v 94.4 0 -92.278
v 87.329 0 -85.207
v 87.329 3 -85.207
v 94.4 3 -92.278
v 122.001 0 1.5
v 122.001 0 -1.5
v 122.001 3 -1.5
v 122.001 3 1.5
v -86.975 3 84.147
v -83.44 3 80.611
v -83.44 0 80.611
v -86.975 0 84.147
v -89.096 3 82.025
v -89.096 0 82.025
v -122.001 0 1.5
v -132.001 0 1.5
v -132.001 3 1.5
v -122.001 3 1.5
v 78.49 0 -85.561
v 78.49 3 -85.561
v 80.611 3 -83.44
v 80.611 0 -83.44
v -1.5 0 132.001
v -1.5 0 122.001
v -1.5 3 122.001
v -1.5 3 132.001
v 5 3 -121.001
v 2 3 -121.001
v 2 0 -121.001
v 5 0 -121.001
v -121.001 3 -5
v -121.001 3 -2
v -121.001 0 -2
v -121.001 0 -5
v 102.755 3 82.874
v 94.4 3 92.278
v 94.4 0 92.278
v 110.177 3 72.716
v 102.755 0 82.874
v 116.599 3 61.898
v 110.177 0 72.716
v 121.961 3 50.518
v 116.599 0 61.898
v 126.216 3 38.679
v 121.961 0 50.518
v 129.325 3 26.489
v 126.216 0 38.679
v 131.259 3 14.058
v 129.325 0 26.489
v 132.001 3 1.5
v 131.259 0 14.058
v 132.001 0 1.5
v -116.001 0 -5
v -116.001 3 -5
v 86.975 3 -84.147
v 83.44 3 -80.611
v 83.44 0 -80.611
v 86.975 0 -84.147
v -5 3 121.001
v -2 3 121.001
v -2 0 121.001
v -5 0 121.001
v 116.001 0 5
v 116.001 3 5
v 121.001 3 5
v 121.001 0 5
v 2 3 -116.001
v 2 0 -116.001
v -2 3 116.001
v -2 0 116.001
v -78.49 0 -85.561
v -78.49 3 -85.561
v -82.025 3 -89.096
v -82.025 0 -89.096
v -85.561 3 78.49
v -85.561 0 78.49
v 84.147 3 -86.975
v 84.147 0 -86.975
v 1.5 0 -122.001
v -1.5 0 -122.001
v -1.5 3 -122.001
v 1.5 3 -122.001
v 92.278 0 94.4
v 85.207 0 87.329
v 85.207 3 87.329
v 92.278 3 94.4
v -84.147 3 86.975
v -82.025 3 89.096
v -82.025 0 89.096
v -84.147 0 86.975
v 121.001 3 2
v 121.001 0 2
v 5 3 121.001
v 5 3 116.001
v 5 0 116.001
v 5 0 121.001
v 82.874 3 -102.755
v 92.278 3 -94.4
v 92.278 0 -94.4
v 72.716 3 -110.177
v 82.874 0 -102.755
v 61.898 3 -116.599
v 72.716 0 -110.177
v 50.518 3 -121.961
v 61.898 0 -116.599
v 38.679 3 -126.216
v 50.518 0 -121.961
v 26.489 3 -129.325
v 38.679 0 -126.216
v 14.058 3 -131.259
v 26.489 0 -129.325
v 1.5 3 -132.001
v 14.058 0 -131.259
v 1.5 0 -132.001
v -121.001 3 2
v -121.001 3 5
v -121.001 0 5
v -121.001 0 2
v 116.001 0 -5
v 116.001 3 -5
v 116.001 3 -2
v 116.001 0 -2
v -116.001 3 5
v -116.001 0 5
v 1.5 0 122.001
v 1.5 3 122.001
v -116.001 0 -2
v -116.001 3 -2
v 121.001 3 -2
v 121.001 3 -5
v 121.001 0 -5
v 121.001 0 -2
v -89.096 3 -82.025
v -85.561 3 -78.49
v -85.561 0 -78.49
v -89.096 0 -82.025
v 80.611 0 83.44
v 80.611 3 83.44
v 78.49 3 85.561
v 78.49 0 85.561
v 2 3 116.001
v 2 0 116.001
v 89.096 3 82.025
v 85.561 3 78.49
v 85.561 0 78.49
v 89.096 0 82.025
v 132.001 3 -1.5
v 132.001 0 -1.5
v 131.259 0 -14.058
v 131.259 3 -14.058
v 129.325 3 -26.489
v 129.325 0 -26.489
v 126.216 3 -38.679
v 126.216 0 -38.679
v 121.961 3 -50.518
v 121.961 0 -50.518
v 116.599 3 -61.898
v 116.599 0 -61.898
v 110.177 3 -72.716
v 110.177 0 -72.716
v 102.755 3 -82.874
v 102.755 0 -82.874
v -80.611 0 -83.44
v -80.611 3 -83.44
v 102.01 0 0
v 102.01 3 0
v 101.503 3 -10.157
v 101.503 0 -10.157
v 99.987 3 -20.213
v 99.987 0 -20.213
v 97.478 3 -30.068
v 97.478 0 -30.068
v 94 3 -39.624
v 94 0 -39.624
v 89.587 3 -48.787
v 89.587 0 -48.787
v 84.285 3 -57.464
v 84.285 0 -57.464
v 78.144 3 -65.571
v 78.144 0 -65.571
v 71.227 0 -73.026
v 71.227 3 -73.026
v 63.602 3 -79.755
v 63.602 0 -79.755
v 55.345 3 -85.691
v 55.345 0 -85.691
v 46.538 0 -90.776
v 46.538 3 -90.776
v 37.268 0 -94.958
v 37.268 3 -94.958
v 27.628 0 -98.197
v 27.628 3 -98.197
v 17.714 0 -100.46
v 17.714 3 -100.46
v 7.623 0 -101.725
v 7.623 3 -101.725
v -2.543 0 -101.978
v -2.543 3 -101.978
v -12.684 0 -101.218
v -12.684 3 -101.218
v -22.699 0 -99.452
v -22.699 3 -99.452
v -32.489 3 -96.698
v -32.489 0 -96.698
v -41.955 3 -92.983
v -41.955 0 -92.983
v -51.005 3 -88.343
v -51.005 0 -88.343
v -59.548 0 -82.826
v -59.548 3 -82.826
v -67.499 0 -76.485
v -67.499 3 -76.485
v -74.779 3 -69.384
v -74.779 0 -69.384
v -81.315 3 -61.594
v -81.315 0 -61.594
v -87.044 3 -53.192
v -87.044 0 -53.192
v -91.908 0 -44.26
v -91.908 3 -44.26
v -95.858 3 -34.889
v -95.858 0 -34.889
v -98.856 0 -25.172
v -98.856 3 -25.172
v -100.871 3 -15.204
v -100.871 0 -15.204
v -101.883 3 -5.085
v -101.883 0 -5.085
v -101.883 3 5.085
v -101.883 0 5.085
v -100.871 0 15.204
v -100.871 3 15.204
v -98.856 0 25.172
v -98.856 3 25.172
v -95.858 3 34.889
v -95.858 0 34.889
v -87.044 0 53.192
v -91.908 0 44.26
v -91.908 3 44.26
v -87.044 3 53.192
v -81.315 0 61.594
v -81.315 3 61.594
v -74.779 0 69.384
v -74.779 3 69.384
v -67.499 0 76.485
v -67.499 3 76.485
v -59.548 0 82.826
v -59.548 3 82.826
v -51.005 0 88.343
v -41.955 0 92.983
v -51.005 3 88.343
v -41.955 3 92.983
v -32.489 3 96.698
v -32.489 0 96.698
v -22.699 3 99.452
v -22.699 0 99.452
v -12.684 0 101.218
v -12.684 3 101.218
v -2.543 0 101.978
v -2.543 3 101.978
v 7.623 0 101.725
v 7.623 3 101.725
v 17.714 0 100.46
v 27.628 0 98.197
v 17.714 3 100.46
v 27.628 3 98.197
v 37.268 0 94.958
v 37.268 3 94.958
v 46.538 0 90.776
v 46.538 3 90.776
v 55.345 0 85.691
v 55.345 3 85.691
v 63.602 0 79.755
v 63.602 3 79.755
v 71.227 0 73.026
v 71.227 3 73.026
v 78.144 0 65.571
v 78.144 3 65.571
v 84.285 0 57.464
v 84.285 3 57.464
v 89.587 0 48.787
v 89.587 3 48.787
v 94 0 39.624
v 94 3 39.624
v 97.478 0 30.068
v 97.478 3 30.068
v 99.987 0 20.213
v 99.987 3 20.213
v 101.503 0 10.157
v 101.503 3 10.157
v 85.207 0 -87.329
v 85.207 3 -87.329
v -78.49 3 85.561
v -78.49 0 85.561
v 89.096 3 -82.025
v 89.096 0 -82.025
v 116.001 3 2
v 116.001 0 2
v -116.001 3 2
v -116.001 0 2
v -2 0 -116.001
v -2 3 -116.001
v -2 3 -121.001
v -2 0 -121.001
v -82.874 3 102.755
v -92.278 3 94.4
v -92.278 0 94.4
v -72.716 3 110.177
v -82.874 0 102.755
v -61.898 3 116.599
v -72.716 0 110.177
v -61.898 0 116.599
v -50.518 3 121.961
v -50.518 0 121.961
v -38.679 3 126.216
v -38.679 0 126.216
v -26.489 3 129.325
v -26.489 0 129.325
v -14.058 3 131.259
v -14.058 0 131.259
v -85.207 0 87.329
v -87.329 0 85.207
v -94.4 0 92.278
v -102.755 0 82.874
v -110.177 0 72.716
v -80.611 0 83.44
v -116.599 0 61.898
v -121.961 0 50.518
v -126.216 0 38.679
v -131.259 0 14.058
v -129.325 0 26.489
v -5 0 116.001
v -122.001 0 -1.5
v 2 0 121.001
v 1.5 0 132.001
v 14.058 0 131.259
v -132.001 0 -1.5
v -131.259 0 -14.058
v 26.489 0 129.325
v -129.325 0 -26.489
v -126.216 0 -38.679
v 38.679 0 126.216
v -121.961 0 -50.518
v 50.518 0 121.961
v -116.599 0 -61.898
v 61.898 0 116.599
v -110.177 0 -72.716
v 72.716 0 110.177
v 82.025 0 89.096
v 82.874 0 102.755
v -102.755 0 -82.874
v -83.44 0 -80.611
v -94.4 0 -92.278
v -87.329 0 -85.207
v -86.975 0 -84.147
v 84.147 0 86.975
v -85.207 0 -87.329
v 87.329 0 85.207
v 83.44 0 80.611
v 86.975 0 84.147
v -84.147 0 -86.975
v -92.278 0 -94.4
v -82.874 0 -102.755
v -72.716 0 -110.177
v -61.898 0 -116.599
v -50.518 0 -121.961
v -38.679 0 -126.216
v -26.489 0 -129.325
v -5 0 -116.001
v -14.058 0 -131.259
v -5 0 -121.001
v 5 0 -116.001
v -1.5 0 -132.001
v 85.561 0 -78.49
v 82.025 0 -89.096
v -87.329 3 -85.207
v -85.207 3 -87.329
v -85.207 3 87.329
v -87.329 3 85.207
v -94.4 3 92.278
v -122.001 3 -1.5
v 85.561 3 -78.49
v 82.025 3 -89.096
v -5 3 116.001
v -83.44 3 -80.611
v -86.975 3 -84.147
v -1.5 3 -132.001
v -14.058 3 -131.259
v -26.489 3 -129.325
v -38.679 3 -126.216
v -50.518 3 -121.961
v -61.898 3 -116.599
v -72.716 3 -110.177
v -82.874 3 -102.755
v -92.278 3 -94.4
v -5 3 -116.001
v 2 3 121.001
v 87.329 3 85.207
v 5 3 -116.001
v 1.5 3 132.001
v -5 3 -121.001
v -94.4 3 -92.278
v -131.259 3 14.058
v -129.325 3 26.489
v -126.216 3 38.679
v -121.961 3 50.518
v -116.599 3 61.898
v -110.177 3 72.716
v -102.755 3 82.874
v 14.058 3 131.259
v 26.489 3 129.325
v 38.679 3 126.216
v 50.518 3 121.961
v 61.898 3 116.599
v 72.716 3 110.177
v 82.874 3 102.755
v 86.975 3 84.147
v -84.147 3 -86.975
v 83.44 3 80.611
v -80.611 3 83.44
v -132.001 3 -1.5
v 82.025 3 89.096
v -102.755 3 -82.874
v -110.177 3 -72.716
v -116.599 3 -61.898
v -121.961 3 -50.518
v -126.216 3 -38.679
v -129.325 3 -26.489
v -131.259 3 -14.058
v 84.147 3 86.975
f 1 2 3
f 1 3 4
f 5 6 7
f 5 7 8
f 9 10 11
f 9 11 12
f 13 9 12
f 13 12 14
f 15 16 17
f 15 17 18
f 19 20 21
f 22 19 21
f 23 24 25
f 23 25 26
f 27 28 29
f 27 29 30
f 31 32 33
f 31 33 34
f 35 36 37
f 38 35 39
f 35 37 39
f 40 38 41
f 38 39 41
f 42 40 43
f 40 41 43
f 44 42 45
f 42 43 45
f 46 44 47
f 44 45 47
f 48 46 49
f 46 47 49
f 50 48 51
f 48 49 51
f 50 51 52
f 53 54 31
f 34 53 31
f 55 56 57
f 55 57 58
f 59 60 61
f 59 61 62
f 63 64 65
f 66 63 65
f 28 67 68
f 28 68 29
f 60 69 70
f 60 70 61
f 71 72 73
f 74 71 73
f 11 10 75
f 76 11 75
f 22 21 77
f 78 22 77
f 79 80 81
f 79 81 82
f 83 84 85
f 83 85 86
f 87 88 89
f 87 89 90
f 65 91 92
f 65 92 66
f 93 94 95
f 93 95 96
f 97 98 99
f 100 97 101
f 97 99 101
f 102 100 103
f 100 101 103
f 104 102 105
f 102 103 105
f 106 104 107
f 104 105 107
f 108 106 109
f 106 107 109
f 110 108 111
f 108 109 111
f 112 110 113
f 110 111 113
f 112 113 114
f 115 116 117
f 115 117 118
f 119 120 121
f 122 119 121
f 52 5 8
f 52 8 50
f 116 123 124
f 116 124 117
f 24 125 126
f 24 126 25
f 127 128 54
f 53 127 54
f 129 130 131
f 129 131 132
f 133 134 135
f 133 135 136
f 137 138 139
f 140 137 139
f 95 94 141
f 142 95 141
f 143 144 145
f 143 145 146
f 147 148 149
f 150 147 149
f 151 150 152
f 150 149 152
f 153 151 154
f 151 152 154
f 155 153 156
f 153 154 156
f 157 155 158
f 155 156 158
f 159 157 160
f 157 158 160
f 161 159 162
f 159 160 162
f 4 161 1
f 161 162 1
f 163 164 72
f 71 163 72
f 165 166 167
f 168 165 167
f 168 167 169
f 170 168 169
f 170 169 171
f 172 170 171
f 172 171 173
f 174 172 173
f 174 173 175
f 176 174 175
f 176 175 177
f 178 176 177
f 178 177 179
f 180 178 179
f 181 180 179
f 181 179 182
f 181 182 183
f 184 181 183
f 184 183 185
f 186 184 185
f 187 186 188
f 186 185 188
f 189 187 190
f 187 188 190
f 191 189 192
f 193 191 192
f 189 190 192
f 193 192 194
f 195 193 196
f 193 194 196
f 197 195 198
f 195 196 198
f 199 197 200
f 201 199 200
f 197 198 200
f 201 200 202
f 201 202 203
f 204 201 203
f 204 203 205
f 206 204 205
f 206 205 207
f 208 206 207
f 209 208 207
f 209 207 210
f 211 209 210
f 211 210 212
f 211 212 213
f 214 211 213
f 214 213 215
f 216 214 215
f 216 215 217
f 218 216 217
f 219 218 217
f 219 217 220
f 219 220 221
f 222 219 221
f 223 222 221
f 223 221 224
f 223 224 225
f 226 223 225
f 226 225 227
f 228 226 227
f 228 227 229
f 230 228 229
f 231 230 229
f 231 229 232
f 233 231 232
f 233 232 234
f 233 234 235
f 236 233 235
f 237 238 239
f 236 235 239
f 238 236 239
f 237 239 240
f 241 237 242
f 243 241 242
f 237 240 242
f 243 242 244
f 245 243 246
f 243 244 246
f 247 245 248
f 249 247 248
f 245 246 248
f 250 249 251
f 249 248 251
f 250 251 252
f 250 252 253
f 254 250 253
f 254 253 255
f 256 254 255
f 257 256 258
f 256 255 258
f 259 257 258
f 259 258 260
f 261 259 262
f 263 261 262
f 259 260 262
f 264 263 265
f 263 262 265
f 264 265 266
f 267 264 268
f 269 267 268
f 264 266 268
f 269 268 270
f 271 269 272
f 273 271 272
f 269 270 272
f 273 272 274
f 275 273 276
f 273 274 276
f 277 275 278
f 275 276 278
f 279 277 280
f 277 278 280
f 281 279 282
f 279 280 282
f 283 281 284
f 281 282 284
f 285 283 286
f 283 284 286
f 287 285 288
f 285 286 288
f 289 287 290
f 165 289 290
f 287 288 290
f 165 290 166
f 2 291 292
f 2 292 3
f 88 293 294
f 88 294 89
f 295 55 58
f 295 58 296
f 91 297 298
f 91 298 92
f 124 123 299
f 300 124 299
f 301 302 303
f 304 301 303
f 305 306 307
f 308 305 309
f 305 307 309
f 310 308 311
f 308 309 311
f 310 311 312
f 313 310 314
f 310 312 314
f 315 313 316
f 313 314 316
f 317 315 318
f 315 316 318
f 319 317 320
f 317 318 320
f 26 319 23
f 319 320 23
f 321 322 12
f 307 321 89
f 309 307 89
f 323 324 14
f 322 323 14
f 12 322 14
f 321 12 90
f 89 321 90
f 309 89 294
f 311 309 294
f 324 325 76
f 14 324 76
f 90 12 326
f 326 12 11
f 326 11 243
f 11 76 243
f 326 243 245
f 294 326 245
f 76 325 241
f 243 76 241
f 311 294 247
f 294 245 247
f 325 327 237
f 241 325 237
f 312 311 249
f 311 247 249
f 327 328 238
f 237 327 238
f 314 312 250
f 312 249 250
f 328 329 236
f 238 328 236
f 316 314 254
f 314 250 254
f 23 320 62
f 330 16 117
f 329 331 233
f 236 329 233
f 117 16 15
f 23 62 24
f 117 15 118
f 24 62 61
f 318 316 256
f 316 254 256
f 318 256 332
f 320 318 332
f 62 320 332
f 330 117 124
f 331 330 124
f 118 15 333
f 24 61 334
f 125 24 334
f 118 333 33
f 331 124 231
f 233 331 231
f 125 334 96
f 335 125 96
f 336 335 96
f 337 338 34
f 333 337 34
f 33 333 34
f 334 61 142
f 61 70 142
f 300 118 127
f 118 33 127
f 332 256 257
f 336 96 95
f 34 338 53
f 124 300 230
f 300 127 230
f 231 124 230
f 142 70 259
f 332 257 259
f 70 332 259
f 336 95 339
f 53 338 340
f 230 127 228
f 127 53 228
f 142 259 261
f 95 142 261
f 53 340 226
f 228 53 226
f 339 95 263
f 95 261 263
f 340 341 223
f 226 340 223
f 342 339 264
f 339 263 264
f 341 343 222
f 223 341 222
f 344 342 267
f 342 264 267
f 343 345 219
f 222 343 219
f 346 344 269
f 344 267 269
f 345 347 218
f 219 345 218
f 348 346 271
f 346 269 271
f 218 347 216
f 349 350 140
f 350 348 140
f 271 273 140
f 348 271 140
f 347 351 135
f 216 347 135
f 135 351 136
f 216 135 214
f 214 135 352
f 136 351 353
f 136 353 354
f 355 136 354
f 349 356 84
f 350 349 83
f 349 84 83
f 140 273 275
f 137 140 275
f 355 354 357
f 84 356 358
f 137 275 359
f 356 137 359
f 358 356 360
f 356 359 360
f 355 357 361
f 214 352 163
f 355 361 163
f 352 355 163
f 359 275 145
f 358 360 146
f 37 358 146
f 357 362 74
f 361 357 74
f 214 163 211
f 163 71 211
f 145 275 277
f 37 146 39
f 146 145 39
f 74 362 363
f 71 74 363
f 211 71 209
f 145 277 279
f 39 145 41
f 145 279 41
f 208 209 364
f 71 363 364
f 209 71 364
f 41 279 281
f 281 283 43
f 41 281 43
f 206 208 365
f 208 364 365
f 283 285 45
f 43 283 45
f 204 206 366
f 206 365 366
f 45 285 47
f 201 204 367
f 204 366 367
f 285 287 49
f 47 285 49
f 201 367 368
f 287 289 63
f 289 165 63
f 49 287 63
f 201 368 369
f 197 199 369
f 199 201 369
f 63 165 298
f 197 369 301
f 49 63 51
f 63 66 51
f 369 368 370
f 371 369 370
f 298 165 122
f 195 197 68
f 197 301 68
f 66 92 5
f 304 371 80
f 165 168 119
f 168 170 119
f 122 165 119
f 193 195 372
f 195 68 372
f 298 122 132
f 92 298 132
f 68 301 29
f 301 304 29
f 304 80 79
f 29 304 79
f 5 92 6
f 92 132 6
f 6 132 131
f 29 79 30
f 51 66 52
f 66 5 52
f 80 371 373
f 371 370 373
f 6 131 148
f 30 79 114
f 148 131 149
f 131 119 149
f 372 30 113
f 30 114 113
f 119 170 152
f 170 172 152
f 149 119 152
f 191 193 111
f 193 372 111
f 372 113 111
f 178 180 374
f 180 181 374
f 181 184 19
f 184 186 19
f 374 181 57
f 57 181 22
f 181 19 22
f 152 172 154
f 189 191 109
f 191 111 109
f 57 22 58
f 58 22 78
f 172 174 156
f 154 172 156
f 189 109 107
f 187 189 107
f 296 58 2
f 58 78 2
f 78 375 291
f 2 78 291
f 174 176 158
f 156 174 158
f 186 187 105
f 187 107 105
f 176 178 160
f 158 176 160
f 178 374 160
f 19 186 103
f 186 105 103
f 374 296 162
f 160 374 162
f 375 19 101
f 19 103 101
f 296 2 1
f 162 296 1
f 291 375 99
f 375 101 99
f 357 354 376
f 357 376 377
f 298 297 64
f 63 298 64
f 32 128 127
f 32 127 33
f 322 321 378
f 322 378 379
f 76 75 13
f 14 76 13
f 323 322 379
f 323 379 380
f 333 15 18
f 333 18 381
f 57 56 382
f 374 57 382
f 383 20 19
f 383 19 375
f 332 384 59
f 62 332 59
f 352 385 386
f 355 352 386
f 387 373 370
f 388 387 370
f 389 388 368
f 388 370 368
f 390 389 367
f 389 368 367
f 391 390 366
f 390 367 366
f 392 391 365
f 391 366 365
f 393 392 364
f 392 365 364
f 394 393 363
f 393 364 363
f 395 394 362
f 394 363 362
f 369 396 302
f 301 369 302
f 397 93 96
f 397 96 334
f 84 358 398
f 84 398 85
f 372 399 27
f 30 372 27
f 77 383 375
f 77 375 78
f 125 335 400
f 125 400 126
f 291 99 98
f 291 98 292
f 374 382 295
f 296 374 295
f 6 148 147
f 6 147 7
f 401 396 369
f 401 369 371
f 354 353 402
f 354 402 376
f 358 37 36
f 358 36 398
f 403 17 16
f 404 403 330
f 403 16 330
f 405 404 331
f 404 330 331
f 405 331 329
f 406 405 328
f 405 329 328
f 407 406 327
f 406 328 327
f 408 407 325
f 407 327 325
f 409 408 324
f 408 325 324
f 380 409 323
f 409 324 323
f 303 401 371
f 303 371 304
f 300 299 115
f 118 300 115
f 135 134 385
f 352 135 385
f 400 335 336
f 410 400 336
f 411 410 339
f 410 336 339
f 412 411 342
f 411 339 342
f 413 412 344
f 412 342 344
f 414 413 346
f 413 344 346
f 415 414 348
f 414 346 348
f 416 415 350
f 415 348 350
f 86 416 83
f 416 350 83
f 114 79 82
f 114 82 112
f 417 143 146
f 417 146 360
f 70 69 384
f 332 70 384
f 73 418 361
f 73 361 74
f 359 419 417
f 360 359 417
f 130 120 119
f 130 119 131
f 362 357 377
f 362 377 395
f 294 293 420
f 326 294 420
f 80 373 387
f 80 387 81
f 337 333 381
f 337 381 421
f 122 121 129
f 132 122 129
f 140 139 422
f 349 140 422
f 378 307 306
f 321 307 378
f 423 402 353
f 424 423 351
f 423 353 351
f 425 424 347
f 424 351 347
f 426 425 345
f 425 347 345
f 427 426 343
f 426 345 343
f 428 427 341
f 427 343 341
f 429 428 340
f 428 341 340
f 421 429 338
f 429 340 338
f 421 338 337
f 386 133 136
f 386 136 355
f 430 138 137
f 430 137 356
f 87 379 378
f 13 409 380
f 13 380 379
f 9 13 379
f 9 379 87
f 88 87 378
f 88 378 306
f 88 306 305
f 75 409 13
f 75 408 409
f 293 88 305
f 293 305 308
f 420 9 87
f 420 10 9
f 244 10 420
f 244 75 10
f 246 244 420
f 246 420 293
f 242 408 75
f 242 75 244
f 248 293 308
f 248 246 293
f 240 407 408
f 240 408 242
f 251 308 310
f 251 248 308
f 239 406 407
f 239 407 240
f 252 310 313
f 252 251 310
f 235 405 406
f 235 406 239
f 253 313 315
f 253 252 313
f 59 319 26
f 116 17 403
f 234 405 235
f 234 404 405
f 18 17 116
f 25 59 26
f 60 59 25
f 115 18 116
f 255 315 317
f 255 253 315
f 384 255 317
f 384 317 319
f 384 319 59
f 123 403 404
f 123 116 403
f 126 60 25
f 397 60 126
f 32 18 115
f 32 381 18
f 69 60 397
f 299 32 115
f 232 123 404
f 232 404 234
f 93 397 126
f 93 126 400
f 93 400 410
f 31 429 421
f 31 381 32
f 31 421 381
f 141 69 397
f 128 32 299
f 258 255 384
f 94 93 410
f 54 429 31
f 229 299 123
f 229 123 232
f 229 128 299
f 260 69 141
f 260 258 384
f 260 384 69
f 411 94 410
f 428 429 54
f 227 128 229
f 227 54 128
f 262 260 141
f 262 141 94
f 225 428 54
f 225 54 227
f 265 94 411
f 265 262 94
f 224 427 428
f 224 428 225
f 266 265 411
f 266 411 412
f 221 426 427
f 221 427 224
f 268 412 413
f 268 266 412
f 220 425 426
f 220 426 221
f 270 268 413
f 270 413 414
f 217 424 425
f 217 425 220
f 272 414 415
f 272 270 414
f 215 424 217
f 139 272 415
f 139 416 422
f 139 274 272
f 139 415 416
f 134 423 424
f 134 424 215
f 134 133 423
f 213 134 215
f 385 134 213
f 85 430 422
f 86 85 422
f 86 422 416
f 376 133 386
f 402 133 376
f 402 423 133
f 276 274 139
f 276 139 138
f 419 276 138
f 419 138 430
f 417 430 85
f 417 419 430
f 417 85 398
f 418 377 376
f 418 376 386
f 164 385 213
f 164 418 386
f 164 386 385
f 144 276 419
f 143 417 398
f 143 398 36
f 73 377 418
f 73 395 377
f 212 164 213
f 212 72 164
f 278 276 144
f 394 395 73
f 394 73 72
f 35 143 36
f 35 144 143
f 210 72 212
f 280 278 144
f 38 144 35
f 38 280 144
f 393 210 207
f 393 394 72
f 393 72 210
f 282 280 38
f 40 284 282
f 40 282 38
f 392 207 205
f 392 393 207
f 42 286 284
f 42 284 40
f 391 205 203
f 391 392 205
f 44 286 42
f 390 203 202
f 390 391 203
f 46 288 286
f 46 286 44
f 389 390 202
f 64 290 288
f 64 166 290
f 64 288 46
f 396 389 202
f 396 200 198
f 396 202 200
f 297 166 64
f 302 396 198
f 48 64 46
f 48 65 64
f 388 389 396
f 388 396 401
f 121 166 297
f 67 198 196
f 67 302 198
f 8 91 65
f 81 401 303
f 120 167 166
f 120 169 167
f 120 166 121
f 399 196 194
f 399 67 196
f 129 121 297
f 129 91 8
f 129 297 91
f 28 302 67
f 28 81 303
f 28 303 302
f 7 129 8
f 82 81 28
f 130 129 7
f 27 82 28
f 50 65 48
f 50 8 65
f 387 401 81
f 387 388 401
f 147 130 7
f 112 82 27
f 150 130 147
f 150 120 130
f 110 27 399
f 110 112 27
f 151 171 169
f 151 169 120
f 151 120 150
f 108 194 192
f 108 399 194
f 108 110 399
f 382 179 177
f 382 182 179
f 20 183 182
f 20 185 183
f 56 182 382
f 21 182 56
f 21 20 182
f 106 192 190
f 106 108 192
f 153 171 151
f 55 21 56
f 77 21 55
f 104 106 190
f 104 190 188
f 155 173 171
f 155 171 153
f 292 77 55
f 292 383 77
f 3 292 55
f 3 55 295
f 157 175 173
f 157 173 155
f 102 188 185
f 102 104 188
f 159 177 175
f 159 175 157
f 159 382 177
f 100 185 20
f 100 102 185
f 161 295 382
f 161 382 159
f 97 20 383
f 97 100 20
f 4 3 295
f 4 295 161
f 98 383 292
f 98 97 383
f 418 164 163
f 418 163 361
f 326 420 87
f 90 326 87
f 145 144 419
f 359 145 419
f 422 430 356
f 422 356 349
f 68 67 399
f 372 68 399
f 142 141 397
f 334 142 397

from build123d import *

# Parameters (mm, degrees)
SKETCH1_R           = 132.01
BOSS_EXTRUDE1_DEPTH = 3
CUT_EXTRUDE1_START  = -3
CUT_EXTRUDE1_DEPTH  = 4
CIRPATTERN1_COUNT   = 8
SKETCH7_W           = 3
SKETCH7_H           = 5
CUT_EXTRUDE4_DEPTH  = 3
CIRPATTERN2_COUNT   = 8
SKETCH8_R           = 102.01
CUT_EXTRUDE6_DEPTH  = 10


with BuildPart() as part:
    # Sketch1 → Boss-Extrude1 (new body)
    with BuildSketch(Plane(origin=(0, 0, 0), x_dir=(1, 0, 0), z_dir=(0, 1, 0))):
        Circle(SKETCH1_R)
    extrude(amount=BOSS_EXTRUDE1_DEPTH)

    # Sketch2 → Cut-Extrude1 (cut)
    with BuildSketch(Plane(origin=(0, 3, 0), x_dir=(1, 0, 0), z_dir=(0, 1, 0)).offset(CUT_EXTRUDE1_START)):
        Polygon((-1.5, 733.700659415), (-1.5, 132.001477643), (-1.5, 122.001477643), (1.5, 122.001477643), (1.5, 132.001477643), (1.5, 733.700659415), (1.5, 1937.099022959), (-1.5, 1937.099022959), align=None)
    cut_extrude1 = extrude(amount=CUT_EXTRUDE1_DEPTH, mode=Mode.SUBTRACT)

    # CirPattern1: Cut-Extrude1 ×8 about axis
    cirpattern1_axis = Axis((0, 0, 0), (0, -1, 0))
    for i in range(1, CIRPATTERN1_COUNT):
        add(cut_extrude1.rotate(cirpattern1_axis, i * 360 / CIRPATTERN1_COUNT), mode=Mode.SUBTRACT)

    # Sketch7 → Cut-Extrude4 (cut)
    with BuildSketch(Plane(origin=(0, 3, 0), x_dir=(1, 0, 0), z_dir=(0, 1, 0))):
        with Locations((-3.5, 118.501477643)):
            Rectangle(SKETCH7_W, SKETCH7_H)
        with Locations((3.5, 118.501477643)):
            Rectangle(SKETCH7_W, SKETCH7_H)
    cut_extrude4 = extrude(amount=-CUT_EXTRUDE4_DEPTH, mode=Mode.SUBTRACT)

    # CirPattern2: Cut-Extrude4 ×8 about axis
    cirpattern2_axis = Axis((0, 0, 0), (0, 1, 0))
    for i in range(1, CIRPATTERN2_COUNT):
        add(cut_extrude4.rotate(cirpattern2_axis, i * 360 / CIRPATTERN2_COUNT), mode=Mode.SUBTRACT)

    # Sketch8 → Cut-Extrude6 (cut)
    with BuildSketch(Plane(origin=(0, 3, 0), x_dir=(1, 0, 0), z_dir=(0, 1, 0))):
        Circle(SKETCH8_R)
    extrude(amount=-CUT_EXTRUDE6_DEPTH, mode=Mode.SUBTRACT)


solid = part.part
